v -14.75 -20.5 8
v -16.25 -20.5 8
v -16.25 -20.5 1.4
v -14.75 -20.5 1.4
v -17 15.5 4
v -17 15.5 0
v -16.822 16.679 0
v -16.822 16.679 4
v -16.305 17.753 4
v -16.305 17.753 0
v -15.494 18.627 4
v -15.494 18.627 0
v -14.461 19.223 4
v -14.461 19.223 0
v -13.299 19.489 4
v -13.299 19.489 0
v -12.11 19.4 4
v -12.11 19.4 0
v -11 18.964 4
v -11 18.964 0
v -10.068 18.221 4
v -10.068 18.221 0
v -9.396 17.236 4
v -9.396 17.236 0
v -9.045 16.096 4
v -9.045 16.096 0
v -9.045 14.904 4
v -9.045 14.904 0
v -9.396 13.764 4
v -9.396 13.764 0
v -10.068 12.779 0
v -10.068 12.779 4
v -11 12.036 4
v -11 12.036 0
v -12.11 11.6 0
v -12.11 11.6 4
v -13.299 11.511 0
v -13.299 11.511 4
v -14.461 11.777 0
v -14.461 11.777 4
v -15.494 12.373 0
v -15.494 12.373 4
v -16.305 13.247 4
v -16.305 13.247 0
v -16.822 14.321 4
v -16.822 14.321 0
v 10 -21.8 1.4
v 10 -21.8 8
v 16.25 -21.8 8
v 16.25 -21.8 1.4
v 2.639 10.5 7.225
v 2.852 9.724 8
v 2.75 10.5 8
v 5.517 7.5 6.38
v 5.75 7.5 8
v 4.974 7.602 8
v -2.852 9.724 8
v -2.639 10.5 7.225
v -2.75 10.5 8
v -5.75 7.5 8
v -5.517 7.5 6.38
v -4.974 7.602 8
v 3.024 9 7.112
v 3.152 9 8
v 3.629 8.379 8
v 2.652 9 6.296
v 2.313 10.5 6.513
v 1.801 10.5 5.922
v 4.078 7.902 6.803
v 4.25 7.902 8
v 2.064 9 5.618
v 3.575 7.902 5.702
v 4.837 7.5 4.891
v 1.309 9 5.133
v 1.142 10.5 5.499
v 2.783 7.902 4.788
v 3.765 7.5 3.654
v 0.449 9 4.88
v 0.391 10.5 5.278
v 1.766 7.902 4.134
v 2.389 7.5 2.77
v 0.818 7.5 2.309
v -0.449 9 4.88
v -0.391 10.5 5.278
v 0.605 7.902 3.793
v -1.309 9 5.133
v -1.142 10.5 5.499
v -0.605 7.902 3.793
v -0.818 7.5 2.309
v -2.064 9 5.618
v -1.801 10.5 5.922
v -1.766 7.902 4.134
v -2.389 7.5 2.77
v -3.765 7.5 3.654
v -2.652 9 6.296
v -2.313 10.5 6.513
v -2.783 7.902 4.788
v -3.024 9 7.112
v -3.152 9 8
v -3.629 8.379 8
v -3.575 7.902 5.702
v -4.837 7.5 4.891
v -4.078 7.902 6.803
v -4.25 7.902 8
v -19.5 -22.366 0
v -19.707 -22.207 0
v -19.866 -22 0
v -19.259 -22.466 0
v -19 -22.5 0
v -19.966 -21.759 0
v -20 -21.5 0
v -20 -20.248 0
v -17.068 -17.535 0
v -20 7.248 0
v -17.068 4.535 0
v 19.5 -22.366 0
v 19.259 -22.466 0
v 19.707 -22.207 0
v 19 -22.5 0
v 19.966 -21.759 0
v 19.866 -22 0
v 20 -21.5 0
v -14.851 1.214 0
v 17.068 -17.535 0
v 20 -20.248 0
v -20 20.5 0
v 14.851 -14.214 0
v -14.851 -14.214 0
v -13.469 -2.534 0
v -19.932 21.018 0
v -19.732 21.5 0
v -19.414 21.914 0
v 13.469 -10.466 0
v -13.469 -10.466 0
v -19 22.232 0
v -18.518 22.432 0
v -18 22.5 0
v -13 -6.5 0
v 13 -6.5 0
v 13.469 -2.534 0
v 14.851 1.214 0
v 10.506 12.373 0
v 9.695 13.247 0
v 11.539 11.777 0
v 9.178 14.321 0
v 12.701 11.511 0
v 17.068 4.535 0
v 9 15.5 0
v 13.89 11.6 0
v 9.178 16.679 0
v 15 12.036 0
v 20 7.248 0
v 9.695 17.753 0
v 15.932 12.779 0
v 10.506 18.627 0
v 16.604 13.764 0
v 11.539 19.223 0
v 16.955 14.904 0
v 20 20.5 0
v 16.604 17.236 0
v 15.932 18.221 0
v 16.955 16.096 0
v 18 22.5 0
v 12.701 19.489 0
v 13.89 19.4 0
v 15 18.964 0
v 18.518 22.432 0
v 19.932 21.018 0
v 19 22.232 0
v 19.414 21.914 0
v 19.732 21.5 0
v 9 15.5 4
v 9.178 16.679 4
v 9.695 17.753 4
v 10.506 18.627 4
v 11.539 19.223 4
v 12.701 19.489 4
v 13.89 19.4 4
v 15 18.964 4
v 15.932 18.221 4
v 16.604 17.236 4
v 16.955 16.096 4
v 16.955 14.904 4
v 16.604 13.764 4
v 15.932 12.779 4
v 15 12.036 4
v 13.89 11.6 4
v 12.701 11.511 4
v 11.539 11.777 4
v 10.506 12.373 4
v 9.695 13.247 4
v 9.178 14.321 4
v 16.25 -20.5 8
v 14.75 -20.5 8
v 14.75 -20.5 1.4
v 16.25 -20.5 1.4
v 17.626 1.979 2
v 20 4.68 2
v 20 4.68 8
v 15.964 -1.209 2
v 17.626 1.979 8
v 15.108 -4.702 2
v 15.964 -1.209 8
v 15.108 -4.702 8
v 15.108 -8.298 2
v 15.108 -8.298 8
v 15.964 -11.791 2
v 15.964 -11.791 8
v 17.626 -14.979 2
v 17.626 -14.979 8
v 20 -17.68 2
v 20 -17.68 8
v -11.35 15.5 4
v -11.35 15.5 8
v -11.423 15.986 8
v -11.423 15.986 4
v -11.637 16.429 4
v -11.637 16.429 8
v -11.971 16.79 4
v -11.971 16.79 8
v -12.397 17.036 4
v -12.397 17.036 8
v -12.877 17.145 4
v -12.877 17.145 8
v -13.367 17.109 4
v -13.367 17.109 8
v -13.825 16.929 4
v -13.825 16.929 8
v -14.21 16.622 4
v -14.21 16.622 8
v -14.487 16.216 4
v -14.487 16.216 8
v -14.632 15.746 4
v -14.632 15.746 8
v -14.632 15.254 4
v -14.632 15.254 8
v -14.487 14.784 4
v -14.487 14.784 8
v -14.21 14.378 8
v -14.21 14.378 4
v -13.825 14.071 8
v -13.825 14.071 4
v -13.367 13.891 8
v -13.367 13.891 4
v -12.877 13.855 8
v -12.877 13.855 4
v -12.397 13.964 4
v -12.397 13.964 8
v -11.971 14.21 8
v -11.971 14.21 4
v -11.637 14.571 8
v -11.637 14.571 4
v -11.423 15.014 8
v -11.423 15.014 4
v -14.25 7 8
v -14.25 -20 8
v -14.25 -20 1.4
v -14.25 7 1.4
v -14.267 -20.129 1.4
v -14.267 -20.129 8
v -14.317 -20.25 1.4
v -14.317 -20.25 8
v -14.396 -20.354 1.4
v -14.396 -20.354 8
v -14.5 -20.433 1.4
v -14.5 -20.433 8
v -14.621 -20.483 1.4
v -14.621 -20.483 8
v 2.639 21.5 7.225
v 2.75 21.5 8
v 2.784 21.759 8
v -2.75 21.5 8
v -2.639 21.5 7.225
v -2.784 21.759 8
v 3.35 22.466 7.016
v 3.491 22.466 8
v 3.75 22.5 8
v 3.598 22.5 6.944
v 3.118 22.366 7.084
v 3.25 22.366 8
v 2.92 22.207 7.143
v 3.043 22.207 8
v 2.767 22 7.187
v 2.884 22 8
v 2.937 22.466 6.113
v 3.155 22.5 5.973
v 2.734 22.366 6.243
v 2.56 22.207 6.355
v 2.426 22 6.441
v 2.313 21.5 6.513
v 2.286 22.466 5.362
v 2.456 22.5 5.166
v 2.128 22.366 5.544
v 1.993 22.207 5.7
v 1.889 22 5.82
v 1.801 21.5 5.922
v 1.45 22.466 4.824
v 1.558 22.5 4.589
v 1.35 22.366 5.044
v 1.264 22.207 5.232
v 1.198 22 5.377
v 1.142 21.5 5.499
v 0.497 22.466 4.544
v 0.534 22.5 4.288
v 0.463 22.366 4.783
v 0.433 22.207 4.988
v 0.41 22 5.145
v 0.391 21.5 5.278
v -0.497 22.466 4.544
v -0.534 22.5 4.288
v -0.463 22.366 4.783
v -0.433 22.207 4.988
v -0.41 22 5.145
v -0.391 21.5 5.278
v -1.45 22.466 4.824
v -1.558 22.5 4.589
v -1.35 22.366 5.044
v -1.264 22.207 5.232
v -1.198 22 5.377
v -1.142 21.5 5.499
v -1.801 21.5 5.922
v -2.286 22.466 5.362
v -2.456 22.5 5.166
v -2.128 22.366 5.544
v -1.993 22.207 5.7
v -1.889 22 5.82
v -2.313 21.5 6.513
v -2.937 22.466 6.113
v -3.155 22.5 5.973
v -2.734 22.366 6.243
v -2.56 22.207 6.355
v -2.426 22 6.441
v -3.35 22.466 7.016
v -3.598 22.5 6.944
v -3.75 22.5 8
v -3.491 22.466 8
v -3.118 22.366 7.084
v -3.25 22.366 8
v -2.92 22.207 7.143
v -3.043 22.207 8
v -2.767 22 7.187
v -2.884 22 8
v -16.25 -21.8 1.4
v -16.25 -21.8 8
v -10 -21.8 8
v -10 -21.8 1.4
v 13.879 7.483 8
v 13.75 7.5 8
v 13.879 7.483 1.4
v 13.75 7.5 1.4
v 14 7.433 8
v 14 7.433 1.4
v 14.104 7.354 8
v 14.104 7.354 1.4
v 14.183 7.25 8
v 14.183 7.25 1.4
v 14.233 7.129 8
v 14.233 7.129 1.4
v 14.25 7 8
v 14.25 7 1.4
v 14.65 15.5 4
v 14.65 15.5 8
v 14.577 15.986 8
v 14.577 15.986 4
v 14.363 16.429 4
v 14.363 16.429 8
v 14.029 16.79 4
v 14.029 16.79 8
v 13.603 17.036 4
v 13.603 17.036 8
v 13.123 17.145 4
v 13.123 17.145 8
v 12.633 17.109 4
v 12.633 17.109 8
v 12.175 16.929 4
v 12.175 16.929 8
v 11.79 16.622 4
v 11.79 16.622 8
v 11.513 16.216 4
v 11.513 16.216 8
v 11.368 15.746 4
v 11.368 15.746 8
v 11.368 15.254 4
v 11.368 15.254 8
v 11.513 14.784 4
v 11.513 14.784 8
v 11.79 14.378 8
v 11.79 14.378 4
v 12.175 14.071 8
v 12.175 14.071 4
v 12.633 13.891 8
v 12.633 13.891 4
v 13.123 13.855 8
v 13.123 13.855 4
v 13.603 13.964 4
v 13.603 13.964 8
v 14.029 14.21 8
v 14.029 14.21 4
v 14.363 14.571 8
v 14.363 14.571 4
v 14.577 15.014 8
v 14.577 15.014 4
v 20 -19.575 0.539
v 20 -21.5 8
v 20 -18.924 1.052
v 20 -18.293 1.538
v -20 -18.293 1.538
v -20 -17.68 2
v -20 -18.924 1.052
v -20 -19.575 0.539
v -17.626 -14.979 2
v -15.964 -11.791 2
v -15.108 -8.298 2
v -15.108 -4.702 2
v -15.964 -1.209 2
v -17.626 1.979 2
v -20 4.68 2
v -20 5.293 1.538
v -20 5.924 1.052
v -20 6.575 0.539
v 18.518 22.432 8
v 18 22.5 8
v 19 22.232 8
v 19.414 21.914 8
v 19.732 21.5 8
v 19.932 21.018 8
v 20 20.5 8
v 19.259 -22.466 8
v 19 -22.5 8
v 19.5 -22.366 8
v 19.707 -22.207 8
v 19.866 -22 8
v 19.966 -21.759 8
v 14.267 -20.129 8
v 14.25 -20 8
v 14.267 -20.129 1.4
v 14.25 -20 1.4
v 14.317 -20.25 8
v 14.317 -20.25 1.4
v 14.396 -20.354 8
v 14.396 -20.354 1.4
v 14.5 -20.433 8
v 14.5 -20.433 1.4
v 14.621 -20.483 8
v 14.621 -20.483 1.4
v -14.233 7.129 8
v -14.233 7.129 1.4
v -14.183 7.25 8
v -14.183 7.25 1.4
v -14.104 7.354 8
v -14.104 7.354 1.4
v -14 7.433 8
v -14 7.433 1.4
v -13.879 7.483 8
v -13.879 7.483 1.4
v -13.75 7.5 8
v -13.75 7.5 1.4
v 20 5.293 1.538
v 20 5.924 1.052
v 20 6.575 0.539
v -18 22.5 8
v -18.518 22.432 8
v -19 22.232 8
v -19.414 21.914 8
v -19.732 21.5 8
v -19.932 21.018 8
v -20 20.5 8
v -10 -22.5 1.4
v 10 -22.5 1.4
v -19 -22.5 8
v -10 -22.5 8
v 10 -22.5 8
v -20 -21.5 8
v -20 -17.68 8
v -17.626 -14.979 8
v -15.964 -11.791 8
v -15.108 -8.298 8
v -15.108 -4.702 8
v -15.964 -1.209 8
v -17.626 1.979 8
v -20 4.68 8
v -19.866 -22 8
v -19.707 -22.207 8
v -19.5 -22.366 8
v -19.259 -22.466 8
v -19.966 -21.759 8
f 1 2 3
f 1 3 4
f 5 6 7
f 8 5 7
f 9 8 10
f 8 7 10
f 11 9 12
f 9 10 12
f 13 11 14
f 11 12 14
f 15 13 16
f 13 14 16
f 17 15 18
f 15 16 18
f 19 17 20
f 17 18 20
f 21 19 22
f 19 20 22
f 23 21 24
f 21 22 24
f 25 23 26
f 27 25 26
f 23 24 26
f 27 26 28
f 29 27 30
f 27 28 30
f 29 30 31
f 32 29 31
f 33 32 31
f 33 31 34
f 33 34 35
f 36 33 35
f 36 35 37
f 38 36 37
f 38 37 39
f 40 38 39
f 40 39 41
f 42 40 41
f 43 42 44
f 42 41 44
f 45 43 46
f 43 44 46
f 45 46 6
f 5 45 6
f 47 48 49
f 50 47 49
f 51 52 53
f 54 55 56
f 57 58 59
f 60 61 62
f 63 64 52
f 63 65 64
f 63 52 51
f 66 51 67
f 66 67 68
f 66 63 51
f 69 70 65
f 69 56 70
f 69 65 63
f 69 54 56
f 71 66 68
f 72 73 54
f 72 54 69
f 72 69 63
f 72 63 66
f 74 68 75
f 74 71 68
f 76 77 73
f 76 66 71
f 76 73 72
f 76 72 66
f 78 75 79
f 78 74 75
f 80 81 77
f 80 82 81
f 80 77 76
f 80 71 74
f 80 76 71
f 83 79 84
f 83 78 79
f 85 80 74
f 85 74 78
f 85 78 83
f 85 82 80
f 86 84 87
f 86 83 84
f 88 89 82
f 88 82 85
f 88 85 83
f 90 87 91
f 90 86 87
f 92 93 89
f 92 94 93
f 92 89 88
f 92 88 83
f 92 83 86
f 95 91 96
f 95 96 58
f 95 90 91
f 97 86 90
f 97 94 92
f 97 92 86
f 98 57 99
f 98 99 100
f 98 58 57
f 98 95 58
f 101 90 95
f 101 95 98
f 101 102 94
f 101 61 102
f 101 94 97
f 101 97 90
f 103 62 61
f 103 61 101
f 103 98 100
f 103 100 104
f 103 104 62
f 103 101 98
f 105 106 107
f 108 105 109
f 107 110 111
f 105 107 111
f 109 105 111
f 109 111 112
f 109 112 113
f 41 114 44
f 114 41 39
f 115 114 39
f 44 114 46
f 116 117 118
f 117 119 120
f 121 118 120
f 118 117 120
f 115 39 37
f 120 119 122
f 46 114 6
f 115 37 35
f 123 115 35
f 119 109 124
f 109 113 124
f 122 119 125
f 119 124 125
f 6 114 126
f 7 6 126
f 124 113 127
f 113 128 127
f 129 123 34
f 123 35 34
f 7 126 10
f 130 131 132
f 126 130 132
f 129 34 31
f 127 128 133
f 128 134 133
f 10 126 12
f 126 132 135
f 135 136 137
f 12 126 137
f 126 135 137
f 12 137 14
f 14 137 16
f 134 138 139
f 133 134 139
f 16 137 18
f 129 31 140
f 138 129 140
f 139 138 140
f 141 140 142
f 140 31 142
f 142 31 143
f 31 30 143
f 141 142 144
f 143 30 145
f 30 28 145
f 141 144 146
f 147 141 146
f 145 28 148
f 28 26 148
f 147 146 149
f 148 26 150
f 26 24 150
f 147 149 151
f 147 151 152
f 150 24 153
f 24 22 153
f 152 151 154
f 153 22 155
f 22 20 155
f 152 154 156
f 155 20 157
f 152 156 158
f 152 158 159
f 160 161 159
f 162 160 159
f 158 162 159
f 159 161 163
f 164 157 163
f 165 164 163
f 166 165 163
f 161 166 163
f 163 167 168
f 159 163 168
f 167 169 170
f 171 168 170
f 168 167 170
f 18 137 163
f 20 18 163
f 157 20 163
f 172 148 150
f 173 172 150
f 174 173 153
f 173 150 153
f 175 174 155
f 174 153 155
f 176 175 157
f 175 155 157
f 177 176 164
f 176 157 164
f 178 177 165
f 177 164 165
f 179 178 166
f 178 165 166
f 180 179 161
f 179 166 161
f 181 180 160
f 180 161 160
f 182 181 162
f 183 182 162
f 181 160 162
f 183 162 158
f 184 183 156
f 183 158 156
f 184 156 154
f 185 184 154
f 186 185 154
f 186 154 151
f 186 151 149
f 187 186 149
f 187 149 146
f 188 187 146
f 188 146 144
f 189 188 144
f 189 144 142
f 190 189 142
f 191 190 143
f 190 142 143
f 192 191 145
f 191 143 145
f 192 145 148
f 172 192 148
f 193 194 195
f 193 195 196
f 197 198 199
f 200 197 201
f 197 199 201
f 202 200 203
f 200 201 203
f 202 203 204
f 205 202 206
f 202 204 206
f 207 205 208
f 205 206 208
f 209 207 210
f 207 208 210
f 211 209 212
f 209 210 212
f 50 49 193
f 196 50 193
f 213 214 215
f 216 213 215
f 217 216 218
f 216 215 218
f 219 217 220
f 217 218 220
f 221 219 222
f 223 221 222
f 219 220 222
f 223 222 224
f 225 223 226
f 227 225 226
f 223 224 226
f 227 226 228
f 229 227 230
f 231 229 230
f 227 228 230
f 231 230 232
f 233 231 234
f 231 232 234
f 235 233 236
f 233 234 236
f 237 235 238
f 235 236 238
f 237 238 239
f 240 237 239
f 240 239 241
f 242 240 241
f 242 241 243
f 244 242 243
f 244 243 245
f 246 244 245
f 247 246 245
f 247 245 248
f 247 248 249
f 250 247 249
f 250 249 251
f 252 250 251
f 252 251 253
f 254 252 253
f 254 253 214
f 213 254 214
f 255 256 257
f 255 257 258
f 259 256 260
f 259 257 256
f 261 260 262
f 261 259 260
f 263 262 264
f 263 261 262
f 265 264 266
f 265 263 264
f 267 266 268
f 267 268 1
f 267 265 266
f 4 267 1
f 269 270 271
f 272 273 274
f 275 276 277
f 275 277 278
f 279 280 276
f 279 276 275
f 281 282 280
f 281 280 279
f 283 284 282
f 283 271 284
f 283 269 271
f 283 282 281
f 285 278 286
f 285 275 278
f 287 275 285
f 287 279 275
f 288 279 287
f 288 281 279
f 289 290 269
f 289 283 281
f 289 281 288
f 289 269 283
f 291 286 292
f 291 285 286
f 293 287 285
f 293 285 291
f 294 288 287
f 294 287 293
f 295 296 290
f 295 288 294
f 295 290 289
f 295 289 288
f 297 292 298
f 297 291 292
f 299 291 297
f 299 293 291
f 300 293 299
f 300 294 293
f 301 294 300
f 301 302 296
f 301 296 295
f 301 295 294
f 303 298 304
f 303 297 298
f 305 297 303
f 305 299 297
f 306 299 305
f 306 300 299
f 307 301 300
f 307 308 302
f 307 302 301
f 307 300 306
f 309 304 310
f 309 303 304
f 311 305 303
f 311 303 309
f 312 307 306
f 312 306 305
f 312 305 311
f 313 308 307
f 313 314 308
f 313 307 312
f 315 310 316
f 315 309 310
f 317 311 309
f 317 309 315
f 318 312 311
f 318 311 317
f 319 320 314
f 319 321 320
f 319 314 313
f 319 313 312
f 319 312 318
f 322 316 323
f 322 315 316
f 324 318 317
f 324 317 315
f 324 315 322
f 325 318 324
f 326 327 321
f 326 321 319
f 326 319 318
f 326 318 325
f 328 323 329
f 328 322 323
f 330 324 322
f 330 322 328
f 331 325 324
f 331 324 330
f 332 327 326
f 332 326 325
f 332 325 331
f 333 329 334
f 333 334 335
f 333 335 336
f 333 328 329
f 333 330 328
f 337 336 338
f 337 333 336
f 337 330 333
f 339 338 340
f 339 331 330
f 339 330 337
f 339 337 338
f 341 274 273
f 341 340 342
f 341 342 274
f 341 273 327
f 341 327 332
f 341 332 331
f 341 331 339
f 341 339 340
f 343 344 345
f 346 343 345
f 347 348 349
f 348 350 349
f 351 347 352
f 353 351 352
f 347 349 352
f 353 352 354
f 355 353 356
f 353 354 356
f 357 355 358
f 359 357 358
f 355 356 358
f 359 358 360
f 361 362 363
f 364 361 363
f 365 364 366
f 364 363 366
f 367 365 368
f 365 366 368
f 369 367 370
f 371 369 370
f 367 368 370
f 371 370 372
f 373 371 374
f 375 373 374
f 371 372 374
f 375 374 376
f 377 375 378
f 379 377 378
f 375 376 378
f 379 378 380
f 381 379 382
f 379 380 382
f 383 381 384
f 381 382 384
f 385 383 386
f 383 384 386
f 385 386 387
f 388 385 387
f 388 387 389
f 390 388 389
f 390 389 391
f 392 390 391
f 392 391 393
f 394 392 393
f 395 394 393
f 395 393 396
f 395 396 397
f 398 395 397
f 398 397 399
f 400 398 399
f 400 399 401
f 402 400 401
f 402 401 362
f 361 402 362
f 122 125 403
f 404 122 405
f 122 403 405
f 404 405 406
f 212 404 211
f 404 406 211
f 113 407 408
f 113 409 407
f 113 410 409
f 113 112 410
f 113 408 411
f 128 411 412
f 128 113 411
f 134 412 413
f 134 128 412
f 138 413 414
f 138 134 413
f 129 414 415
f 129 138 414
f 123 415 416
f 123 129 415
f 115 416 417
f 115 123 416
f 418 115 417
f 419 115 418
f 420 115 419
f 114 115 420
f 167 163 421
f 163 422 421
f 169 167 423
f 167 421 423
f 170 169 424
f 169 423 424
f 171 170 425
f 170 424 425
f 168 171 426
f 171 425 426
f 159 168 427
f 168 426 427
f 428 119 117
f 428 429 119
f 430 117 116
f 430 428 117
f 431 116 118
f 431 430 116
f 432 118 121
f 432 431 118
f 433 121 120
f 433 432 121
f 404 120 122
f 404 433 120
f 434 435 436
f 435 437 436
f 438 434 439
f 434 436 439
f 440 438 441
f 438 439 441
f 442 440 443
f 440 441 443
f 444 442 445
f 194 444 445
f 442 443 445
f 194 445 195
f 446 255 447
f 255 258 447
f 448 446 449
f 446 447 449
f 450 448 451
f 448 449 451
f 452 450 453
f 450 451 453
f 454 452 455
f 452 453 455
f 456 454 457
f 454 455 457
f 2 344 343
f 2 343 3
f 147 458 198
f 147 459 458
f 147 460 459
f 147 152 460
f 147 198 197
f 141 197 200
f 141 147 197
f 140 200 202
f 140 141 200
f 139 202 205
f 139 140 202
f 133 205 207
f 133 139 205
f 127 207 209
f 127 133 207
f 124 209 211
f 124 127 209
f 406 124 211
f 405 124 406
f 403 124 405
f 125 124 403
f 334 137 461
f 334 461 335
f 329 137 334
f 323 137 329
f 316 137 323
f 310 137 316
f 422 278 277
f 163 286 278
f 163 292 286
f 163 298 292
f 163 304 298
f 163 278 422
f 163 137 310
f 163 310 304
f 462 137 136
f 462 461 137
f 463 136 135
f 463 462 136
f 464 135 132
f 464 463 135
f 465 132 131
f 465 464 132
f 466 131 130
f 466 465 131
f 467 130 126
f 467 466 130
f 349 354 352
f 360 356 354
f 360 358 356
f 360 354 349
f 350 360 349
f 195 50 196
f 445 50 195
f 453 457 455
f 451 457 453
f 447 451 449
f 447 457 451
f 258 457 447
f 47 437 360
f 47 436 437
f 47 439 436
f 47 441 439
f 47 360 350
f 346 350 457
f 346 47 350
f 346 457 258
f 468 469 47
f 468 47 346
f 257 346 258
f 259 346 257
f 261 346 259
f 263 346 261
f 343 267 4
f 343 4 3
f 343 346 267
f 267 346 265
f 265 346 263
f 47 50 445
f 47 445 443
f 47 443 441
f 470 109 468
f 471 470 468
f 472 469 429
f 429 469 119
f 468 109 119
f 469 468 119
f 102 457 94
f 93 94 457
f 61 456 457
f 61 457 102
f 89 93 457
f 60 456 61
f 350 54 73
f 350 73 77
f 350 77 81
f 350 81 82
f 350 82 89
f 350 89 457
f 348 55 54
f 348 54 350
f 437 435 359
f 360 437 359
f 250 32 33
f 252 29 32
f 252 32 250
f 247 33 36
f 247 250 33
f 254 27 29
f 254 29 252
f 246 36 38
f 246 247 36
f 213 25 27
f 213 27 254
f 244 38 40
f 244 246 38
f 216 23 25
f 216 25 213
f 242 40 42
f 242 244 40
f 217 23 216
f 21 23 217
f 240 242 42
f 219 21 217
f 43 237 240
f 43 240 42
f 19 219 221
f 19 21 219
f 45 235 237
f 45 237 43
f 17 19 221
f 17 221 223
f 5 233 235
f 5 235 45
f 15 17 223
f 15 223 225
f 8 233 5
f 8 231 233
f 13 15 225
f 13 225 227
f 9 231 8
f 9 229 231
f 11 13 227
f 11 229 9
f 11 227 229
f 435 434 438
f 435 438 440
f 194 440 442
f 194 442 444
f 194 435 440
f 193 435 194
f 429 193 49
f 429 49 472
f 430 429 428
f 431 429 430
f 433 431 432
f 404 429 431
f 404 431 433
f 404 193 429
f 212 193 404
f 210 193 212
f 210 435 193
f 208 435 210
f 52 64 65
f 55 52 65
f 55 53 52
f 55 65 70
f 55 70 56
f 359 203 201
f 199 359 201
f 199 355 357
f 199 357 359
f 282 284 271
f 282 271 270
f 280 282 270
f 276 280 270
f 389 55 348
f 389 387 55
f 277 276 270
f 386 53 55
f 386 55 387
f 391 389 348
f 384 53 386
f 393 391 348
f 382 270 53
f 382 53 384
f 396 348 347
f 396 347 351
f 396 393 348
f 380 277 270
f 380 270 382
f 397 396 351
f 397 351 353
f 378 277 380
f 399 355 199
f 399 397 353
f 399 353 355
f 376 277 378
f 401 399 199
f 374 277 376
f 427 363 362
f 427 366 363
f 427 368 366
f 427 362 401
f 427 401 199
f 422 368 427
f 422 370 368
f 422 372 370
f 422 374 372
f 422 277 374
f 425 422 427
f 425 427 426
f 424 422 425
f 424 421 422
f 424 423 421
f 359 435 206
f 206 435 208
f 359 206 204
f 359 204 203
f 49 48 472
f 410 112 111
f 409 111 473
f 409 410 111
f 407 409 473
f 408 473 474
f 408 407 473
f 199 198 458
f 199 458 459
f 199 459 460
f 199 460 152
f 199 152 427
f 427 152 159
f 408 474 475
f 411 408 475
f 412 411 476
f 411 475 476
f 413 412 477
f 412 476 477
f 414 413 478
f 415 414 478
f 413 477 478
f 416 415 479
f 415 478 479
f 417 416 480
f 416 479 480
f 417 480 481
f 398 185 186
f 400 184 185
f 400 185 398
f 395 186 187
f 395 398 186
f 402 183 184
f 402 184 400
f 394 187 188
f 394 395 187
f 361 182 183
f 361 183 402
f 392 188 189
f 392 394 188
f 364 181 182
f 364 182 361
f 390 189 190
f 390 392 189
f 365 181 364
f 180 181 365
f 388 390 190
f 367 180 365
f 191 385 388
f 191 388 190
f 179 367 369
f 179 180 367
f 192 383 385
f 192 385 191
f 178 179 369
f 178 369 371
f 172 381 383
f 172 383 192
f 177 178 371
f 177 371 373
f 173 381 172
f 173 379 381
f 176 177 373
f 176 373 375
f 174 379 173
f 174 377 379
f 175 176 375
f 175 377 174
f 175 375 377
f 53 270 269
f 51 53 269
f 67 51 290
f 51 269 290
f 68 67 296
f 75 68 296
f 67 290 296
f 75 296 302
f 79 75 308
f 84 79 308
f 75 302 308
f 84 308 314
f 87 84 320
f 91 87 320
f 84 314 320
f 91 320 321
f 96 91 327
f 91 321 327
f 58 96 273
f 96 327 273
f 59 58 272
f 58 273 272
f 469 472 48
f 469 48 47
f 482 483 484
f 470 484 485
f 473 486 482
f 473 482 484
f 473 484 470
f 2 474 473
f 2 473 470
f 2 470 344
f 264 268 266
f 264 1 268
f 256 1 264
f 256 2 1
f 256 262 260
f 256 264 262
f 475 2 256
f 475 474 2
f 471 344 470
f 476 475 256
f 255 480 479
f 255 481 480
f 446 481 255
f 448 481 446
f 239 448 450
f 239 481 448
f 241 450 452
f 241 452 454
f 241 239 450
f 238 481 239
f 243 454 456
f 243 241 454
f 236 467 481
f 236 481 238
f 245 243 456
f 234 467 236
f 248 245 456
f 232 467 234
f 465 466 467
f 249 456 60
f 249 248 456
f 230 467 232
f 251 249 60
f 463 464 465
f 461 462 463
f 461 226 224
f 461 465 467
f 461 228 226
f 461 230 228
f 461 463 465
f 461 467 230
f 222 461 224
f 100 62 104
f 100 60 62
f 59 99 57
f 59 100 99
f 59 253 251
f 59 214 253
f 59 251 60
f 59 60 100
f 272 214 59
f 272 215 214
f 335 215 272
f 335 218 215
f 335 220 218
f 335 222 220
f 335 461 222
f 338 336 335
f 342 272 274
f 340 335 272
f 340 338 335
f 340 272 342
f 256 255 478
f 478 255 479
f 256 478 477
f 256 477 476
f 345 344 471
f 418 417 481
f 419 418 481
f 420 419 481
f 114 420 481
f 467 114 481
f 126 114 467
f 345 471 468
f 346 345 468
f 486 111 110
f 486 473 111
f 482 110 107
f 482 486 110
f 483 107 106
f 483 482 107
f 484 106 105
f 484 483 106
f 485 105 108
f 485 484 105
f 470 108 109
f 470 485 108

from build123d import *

# Parameters (mm, degrees)
CROQUIS1_W              = 40
CROQUIS1_H              = 45
SALIENTE_EXTRUIR1_DEPTH = 8
CROQUIS2_W              = 32.5
CROQUIS2_H              = 1.3
CORTAR_EXTRUIR1_DEPTH   = 6.6
CROQUIS3_R              = 15
CORTAR_EXTRUIR2_DEPTH   = 10
CHAFL_N1_SIZE           = 2
CROQUIS4_W              = 28.5
CROQUIS4_H              = 28
CORTAR_EXTRUIR3_DEPTH   = 6.6
CROQUIS6_R              = 2.75
CORTAR_EXTRUIR4_DEPTH   = 16.6
CROQUIS7_R              = 1.65
CORTAR_EXTRUIR5_DEPTH   = 16.6
CROQUIS8_R              = 4
CORTAR_EXTRUIR6_DEPTH   = 4
CROQUIS9_W              = 20
CROQUIS9_H              = 6.6
CORTAR_EXTRUIR7_DEPTH   = 4
REDONDEO1_R             = 1
REDONDEO2_R             = 2
REDONDEO3_R             = 1
REDONDEO4_R             = 3
REDONDEO5_R             = 0.5
REDONDEO6_R             = 0.5


with BuildPart() as part:
    # Croquis1 → Saliente-Extruir1 (new body)
    with BuildSketch(Plane.XY):
        Rectangle(CROQUIS1_W, CROQUIS1_H)
    extrude(amount=SALIENTE_EXTRUIR1_DEPTH)

    # Croquis2 → Cortar-Extruir1 (cut)
    with BuildSketch(Plane.XY.offset(8)):
        with Locations((0, -21.15)):
            Rectangle(CROQUIS2_W, CROQUIS2_H)
    extrude(amount=-CORTAR_EXTRUIR1_DEPTH, mode=Mode.SUBTRACT)

    # Croquis3 → Cortar-Extruir2 (cut)
    with BuildSketch(Plane.XY.offset(8)):
        with Locations((-30, -6.5)):
            Circle(CROQUIS3_R)
        with Locations((30, -6.5)):
            Circle(CROQUIS3_R)
    extrude(amount=-CORTAR_EXTRUIR2_DEPTH, mode=Mode.SUBTRACT)

    # Chaflán1
    chafl_n1_edges = [part.edges().sort_by_distance(p)[0] for p in [
        (-15, -6.5, 0),
        (15, -6.5, 0),
    ]]
    chamfer(chafl_n1_edges, length=CHAFL_N1_SIZE)

    # Croquis4 → Cortar-Extruir3 (cut)
    with BuildSketch(Plane.XY.offset(8)):
        with Locations((0, -6.5)):
            Rectangle(CROQUIS4_W, CROQUIS4_H)
    extrude(amount=-CORTAR_EXTRUIR3_DEPTH, mode=Mode.SUBTRACT)

    # Croquis6 → Cortar-Extruir4 (cut)
    with BuildSketch(Plane(origin=(0, 22.5, 0), x_dir=(1, 0, 0), z_dir=(0, 1, 0))):
        with Locations((0, -8)):
            Circle(CROQUIS6_R)
    extrude(amount=-CORTAR_EXTRUIR4_DEPTH, mode=Mode.SUBTRACT)

    # Croquis7 → Cortar-Extruir5 (cut)
    with BuildSketch(Plane.XY.offset(8)):
        with Locations((13, 15.5)):
            Circle(CROQUIS7_R)
        with Locations((-13, 15.5)):
            Circle(CROQUIS7_R)
    extrude(amount=-CORTAR_EXTRUIR5_DEPTH, mode=Mode.SUBTRACT)

    # Croquis8 → Cortar-Extruir6 (cut)
    with BuildSketch(Plane(origin=(0, 0, 0), x_dir=(-1, 0, 0), z_dir=(0, 0, -1))):
        with Locations((13, 15.5)):
            Circle(CROQUIS8_R)
        with Locations((-13, 15.5)):
            Circle(CROQUIS8_R)
    extrude(amount=-CORTAR_EXTRUIR6_DEPTH, mode=Mode.SUBTRACT)

    # Croquis9 → Cortar-Extruir7 (cut)
    with BuildSketch(Plane(origin=(0, -22.5, 0), x_dir=(-1, 0, 0), z_dir=(0, -1, 0))):
        with Locations((0, -4.7)):
            Rectangle(CROQUIS9_W, CROQUIS9_H)
    extrude(amount=-CORTAR_EXTRUIR7_DEPTH, mode=Mode.SUBTRACT)

    # Redondeo1
    redondeo1_edges = [part.edges().sort_by_distance(p)[0] for p in [
        (0, 22.5, 5.25),
    ]]
    fillet(redondeo1_edges, radius=REDONDEO1_R)

    # Redondeo2
    redondeo2_edges = [part.edges().sort_by_distance(p)[0] for p in [
        (-20, 22.5, 4),
        (20, 22.5, 4),
    ]]
    fillet(redondeo2_edges, radius=REDONDEO2_R)

    # Redondeo3
    redondeo3_edges = [part.edges().sort_by_distance(p)[0] for p in [
        (20, -22.5, 4),
        (-20, -22.5, 4),
    ]]
    fillet(redondeo3_edges, radius=REDONDEO3_R)

    # Redondeo4
    redondeo4_edges = [part.edges().sort_by_distance(p)[0] for p in [
        (0, 7.5, 5.25),
    ]]
    fillet(redondeo4_edges, radius=REDONDEO4_R)

    # Redondeo5
    redondeo5_edges = [part.edges().sort_by_distance(p)[0] for p in [
        (14.25, -20.5, 4.7),
        (-14.25, -20.5, 4.7),
    ]]
    fillet(redondeo5_edges, radius=REDONDEO5_R)

    # Redondeo6
    redondeo6_edges = [part.edges().sort_by_distance(p)[0] for p in [
        (-14.25, 7.5, 4.7),
        (14.25, 7.5, 4.7),
    ]]
    fillet(redondeo6_edges, radius=REDONDEO6_R)


solid = part.part
